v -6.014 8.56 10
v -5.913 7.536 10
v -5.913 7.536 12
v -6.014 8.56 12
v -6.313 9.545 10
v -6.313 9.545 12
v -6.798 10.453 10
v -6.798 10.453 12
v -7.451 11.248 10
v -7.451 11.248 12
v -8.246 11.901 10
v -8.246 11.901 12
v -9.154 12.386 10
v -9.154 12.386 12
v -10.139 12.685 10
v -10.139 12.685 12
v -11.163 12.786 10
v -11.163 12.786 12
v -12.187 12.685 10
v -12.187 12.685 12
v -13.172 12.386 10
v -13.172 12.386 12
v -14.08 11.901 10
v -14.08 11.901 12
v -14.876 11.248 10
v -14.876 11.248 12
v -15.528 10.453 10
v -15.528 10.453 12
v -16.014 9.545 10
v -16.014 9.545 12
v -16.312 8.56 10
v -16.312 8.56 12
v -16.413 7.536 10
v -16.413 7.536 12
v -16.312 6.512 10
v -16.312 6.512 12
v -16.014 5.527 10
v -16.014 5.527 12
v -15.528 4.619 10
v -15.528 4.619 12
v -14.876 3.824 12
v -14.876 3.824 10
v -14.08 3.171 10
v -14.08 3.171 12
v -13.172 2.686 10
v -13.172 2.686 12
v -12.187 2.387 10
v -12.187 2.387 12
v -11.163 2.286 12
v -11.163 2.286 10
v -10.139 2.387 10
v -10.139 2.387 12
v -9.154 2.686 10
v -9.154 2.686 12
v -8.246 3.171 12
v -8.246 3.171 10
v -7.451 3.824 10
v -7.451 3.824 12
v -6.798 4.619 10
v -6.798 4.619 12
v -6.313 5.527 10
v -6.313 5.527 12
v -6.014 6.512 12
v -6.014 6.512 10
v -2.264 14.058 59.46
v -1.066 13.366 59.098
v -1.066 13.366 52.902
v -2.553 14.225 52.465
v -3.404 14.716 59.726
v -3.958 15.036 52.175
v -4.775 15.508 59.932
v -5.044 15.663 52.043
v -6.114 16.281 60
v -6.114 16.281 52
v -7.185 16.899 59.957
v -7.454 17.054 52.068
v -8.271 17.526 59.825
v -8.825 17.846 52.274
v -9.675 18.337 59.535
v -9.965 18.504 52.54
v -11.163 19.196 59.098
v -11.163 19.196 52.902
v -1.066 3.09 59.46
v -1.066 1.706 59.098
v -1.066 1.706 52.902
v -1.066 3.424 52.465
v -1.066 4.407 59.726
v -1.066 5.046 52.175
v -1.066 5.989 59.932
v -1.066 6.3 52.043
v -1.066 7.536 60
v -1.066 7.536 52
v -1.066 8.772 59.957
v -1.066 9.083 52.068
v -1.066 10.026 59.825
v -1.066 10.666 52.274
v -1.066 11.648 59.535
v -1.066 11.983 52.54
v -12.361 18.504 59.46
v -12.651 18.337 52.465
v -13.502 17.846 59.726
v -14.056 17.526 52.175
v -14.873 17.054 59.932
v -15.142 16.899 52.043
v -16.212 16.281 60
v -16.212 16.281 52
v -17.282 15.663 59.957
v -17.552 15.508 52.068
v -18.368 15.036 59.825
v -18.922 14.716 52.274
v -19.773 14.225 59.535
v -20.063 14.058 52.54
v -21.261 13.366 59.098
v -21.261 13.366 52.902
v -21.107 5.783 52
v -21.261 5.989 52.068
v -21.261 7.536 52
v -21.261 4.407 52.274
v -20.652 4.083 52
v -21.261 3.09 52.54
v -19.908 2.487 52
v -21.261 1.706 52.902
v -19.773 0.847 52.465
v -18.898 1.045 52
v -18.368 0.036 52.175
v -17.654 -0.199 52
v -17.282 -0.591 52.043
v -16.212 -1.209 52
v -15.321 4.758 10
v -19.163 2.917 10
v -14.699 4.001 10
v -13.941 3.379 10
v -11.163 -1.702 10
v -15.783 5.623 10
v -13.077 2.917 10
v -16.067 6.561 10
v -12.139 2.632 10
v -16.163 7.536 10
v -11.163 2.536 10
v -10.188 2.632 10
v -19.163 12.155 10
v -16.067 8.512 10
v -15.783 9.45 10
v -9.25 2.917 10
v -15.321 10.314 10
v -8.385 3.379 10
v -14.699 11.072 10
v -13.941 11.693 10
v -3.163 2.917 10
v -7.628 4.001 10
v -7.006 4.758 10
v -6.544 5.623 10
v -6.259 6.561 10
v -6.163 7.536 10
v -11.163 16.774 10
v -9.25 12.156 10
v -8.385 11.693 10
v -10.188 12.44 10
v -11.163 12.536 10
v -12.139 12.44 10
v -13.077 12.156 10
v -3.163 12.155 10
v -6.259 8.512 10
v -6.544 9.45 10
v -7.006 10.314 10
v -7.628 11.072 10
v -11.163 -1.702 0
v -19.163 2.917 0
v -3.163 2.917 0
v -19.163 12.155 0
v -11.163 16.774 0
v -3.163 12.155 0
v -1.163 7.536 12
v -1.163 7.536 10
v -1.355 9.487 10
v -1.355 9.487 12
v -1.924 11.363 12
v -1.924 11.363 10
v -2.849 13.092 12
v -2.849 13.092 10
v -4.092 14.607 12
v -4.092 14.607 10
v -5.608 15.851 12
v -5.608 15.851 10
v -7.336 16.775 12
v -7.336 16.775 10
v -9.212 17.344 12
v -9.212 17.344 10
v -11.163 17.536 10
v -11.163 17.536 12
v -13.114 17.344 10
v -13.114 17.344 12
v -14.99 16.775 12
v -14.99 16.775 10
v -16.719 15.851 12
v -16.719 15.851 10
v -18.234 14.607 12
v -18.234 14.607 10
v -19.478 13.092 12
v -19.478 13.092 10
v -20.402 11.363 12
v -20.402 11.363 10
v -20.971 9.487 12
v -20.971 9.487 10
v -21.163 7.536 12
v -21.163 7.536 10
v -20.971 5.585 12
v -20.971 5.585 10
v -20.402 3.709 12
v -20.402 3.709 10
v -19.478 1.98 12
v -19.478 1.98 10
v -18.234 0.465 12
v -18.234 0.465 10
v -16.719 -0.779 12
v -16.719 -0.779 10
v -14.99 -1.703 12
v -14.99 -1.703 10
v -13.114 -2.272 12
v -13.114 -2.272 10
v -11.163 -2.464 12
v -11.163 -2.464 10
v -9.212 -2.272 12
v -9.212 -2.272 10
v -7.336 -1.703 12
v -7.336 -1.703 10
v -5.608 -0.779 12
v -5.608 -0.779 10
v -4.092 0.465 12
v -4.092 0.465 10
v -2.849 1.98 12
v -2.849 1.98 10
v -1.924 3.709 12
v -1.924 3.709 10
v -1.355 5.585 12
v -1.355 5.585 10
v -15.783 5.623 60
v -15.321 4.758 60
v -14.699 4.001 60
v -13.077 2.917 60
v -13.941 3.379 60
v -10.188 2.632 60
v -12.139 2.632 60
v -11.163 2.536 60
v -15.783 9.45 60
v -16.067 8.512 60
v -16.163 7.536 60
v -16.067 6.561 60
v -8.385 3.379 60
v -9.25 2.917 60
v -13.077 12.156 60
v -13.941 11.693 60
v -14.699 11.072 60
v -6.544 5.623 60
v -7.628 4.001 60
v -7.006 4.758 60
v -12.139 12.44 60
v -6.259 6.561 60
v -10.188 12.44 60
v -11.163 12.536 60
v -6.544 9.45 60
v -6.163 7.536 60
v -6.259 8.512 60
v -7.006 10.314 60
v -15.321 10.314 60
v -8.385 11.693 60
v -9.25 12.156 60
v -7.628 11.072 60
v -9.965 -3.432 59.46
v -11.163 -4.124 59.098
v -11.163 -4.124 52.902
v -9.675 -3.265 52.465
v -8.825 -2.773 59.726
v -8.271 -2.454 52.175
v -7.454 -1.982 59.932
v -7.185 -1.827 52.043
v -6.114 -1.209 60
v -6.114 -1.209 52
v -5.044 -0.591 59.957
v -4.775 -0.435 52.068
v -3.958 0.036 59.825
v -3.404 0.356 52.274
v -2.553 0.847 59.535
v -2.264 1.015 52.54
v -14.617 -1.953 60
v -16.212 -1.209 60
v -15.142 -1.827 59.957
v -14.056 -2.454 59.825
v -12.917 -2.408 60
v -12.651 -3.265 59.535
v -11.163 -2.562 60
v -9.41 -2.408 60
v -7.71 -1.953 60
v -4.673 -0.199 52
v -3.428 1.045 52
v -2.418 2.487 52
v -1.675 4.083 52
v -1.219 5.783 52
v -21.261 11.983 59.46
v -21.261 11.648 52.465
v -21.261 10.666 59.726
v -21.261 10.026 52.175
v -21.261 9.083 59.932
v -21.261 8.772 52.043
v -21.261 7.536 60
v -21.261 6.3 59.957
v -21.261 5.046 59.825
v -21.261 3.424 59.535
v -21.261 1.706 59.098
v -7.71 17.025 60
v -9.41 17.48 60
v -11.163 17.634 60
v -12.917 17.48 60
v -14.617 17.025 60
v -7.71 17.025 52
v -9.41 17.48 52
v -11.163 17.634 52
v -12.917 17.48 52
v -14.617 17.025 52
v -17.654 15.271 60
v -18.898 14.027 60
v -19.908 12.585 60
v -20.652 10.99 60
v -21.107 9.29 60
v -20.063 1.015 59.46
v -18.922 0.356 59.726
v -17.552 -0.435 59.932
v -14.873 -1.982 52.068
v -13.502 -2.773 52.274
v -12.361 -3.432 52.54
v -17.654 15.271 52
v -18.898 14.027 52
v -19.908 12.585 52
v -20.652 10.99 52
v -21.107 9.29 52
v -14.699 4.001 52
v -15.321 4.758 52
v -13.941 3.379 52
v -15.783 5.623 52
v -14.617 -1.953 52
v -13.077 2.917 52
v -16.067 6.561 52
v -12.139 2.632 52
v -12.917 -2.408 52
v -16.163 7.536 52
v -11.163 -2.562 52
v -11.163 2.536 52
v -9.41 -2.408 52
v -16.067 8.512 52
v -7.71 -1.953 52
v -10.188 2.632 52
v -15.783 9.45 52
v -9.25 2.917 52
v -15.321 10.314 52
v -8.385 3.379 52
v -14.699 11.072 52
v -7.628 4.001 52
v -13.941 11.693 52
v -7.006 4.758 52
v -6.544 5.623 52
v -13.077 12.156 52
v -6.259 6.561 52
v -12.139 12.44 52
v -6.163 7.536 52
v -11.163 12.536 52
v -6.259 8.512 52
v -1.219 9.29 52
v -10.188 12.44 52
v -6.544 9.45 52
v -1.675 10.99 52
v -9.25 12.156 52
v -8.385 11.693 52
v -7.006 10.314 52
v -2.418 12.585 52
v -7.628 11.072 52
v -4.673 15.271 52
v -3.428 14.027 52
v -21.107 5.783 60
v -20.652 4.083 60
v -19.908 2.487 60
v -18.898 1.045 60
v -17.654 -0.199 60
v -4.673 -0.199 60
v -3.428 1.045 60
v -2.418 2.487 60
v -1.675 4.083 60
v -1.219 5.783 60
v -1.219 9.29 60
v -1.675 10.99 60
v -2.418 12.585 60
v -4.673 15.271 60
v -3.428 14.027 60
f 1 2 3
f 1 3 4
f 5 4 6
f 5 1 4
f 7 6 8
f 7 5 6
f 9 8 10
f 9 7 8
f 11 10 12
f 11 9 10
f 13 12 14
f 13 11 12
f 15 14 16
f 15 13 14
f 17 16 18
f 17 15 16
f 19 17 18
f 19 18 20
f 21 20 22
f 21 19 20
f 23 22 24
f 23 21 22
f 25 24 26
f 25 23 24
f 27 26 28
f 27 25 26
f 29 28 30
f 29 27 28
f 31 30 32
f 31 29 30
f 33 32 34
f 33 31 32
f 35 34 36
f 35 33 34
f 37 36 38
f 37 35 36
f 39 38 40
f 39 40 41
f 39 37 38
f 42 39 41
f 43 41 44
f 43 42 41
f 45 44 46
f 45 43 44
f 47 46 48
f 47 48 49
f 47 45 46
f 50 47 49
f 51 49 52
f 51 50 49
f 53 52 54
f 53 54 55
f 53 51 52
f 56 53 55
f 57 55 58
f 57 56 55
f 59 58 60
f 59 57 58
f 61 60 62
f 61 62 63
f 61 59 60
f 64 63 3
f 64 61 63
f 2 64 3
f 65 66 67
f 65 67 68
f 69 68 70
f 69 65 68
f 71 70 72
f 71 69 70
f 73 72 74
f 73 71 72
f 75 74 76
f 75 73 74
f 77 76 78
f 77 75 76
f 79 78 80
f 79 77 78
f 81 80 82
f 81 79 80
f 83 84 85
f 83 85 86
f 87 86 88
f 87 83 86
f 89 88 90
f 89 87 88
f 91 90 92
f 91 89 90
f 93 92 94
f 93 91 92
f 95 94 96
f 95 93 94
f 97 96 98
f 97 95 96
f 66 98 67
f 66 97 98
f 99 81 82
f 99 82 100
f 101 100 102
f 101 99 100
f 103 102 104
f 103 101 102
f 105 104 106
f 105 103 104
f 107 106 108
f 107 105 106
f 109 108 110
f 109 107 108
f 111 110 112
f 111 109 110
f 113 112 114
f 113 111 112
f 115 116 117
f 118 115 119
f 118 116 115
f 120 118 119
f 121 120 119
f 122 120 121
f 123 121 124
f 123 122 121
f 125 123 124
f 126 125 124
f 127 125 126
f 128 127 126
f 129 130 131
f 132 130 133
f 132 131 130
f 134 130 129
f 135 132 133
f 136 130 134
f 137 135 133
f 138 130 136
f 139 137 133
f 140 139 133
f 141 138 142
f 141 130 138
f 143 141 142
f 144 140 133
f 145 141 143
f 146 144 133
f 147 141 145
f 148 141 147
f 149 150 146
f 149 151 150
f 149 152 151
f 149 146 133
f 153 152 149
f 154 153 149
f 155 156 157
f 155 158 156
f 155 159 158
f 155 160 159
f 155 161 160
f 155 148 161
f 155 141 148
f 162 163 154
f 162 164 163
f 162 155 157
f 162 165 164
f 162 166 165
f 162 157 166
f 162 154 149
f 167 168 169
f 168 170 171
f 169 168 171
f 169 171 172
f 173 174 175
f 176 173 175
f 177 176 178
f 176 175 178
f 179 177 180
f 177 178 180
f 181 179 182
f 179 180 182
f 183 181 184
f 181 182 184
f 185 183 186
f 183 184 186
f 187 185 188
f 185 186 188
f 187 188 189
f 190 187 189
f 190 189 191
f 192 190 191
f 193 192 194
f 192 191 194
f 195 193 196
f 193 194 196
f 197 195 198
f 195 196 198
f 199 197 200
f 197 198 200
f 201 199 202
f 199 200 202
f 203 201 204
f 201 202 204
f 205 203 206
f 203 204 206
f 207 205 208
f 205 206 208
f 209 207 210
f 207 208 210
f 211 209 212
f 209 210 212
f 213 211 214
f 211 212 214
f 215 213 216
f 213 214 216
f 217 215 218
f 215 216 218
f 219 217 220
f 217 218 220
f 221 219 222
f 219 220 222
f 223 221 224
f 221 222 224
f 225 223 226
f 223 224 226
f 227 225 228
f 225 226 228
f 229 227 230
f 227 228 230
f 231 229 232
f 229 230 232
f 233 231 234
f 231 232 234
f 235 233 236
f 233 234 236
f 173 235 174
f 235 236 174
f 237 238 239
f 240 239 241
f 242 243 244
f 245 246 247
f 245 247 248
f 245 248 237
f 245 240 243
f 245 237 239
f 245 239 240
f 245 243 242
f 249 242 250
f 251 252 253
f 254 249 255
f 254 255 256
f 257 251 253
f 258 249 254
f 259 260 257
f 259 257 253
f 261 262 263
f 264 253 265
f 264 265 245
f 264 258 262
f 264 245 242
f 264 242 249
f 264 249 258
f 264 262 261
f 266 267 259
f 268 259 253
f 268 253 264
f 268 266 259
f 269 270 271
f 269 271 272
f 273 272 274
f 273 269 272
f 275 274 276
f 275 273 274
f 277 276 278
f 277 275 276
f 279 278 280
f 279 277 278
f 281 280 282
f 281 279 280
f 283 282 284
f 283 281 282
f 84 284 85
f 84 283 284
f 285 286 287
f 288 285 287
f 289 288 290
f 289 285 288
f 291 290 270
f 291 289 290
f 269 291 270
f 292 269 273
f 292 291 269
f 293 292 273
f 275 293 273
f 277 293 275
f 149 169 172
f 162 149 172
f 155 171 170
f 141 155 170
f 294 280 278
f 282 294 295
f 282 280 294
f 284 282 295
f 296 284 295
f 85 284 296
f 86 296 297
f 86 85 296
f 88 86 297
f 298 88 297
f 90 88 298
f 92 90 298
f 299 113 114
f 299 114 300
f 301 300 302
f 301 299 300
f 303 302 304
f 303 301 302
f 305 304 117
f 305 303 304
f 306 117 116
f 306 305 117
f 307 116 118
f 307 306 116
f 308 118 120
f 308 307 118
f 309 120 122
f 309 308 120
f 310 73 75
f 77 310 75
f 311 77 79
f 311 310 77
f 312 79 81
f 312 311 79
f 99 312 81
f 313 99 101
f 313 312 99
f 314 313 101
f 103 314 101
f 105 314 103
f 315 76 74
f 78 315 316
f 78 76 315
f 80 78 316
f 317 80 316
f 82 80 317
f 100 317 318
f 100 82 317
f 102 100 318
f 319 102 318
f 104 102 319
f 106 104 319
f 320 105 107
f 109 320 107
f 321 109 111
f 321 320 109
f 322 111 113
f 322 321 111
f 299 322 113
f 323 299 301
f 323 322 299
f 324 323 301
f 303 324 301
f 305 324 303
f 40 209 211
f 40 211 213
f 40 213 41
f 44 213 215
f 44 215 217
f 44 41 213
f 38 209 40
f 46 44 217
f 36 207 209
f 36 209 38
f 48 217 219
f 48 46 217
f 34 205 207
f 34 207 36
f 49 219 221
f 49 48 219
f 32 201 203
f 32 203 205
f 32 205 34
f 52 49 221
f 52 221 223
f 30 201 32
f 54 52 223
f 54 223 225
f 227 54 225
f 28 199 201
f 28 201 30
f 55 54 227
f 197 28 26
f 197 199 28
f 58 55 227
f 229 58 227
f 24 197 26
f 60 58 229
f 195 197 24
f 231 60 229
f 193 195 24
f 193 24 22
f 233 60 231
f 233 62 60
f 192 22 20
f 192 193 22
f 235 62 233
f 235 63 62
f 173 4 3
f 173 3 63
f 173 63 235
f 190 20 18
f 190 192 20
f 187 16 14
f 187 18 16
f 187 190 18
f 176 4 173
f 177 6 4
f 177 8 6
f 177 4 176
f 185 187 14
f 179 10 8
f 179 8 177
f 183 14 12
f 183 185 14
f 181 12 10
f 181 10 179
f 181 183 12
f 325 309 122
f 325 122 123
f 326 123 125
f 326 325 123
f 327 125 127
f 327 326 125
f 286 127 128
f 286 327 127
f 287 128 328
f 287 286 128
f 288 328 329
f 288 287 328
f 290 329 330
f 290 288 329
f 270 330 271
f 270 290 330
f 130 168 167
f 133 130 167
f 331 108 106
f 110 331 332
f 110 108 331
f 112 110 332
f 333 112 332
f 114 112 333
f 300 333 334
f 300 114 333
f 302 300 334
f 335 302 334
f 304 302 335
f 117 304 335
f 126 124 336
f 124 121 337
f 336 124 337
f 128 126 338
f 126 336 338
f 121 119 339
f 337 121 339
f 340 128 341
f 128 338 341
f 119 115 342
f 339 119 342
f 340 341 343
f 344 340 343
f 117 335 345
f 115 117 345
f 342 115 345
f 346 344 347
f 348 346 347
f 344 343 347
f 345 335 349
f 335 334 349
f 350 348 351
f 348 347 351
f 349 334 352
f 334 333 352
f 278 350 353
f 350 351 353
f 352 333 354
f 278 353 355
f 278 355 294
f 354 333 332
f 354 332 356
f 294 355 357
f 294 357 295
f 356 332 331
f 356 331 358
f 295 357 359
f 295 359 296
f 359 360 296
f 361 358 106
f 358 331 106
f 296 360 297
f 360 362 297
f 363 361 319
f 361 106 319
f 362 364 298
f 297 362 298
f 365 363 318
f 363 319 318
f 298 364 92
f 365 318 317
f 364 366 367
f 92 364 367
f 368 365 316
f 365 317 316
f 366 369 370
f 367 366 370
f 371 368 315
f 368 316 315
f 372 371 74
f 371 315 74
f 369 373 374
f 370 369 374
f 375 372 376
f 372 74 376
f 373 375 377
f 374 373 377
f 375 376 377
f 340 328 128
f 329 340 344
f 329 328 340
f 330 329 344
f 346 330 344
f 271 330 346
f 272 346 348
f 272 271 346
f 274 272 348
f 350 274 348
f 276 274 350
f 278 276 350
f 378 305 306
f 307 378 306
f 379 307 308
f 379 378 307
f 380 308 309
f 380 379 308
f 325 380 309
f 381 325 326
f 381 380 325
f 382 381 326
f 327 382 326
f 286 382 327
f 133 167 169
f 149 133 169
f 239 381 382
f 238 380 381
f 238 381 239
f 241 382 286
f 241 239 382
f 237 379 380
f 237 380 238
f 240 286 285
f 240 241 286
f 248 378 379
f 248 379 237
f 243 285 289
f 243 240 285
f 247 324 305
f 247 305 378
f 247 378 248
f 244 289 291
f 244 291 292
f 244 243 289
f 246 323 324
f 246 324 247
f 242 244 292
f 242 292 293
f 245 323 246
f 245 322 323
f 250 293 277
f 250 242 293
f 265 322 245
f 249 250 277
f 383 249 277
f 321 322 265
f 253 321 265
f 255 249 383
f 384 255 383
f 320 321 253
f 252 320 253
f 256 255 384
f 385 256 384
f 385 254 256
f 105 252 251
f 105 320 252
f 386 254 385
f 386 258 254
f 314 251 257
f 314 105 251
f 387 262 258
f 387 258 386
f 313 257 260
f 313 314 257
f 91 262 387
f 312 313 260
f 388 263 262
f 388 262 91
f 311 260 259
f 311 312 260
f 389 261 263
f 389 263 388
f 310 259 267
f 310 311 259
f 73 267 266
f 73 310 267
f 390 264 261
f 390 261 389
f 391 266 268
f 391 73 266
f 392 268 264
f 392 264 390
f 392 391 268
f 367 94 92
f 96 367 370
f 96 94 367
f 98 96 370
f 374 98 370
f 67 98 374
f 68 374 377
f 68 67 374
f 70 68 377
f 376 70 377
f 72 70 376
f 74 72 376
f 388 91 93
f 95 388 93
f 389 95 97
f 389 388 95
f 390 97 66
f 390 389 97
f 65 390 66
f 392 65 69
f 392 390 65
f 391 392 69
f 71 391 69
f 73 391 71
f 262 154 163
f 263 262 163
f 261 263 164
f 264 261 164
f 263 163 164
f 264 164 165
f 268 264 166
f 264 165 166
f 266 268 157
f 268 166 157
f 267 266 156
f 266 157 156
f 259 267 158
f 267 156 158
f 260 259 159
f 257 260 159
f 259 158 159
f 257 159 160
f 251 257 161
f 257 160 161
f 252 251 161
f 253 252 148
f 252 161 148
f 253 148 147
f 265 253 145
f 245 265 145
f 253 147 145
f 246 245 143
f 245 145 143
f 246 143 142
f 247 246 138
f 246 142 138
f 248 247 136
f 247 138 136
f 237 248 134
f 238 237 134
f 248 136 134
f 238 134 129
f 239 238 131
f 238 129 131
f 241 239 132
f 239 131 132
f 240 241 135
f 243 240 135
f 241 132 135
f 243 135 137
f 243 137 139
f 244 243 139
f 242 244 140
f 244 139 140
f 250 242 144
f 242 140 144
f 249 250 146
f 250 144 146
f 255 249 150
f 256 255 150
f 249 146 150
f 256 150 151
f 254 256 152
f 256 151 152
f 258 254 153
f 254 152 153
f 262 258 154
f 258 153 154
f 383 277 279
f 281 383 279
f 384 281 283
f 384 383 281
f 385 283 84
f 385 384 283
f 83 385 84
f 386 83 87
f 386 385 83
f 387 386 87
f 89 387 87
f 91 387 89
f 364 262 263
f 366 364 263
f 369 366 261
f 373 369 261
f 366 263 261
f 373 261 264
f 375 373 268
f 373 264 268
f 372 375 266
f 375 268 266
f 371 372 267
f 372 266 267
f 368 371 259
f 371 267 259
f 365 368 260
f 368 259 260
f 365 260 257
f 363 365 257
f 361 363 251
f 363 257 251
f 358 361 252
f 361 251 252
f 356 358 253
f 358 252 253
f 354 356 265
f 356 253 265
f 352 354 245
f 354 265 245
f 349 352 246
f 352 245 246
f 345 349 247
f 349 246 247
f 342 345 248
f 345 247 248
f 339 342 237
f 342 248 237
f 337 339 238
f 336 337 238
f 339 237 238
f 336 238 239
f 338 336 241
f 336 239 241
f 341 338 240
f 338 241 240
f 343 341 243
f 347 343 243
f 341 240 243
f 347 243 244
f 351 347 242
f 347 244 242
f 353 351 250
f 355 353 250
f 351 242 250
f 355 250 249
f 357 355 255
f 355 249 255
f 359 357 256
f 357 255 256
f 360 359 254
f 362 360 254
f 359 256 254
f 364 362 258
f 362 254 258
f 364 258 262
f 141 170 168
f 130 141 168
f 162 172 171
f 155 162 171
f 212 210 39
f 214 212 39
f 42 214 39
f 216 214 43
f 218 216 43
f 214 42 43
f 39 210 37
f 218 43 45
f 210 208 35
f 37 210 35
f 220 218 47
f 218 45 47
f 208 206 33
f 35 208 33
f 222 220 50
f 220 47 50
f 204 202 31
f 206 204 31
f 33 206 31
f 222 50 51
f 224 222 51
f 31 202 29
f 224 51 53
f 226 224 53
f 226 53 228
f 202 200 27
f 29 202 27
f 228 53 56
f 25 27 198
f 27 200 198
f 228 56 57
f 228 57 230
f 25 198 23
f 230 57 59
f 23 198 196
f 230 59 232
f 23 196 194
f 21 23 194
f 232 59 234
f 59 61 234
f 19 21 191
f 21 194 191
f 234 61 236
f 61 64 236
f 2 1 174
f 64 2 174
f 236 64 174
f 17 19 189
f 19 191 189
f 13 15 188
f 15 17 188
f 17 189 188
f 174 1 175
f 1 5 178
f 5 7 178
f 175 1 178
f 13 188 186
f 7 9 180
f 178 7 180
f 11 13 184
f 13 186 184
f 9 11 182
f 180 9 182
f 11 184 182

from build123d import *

# Parameters (mm, degrees)
SKETCH1_R           = 5
BOSS_EXTRUDE1_DEPTH = 10
BOSS_EXTRUDE2_START = 10
SKETCH1_3_R         = 5
BOSS_EXTRUDE2_DEPTH = 50
BOSS_EXTRUDE3_START = 10
SKETCH3_R           = 10
SKETCH3_R_2         = 5.25
BOSS_EXTRUDE3_DEPTH = 2
SKETCH4_R           = 5
BOSS_EXTRUDE4_DEPTH = 8


with BuildPart() as part:
    # Sketch1 → Boss-Extrude1 (new body)
    # profile 1 of 2: a face of its own
    with BuildSketch(Plane.XY):
        Polygon((-11.163210479, -1.701501358), (-3.163210479, 2.917300796), (-3.163210479, 12.154905103), (-11.163210479, 16.773707256), (-19.163210479, 12.154905103), (-19.163210479, 2.917300796), align=None)
        with Locations((-11.163210479, 7.536102949)):
            Circle(SKETCH1_R, mode=Mode.SUBTRACT)
    # profile 2 of 2: a face of its own
    with BuildSketch(Plane.XY):
        with Locations((-11.163210479, 7.536102949)):
            Circle(SKETCH1_R)
    extrude(amount=BOSS_EXTRUDE1_DEPTH)

    # Sketch1<3> → Boss-Extrude2 (add)
    with BuildSketch(Plane.XY.offset(BOSS_EXTRUDE2_START)):
        with Locations((-11.163210479, 7.536102949)):
            Circle(SKETCH1_3_R)
    extrude(amount=BOSS_EXTRUDE2_DEPTH)


with BuildPart() as body_2:
    # Sketch3 → Boss-Extrude3 (new body)
    with BuildSketch(Plane.XY.offset(BOSS_EXTRUDE3_START)):
        with Locations((-11.163210479, 7.536102949)):
            Circle(SKETCH3_R)
        with Locations((-11.163210479, 7.536102949)):
            Circle(SKETCH3_R_2, mode=Mode.SUBTRACT)
    extrude(amount=BOSS_EXTRUDE3_DEPTH)


with BuildPart() as body_3:
    # Sketch4 → Boss-Extrude4 (new body)
    with BuildSketch(Plane.XY.offset(60)):
        Polygon((-11.163210479, -4.123618998), (-1.065595071, 1.706241975), (-1.065595071, 13.365963923), (-11.163210479, 19.195824897), (-21.260825886, 13.365963923), (-21.260825886, 1.706241975), align=None)
        with Locations((-11.163210479, 7.536102949)):
            Circle(SKETCH4_R, mode=Mode.SUBTRACT)
    extrude(amount=-BOSS_EXTRUDE4_DEPTH)

    # Sketch5 → Cut-Revolve1 (revolve, cut)
    with BuildSketch(Plane(origin=(0, 7.536102949, 0), x_dir=(-1, 0, 0), z_dir=(0, -1, 0))):
        Polygon((28.189029116, -56), (14.332622656, -64), (14.332622656, -68.5), (39.332622656, -68.5), (39.332622656, -43.5), (14.332622656, -43.5), (14.332622656, -48), align=None)
    revolve(axis=Axis((-11.163210479, 7.536102949, 101.6), (0, 0, 1)), mode=Mode.SUBTRACT)


solid = Compound([part.part, body_2.part, body_3.part])
